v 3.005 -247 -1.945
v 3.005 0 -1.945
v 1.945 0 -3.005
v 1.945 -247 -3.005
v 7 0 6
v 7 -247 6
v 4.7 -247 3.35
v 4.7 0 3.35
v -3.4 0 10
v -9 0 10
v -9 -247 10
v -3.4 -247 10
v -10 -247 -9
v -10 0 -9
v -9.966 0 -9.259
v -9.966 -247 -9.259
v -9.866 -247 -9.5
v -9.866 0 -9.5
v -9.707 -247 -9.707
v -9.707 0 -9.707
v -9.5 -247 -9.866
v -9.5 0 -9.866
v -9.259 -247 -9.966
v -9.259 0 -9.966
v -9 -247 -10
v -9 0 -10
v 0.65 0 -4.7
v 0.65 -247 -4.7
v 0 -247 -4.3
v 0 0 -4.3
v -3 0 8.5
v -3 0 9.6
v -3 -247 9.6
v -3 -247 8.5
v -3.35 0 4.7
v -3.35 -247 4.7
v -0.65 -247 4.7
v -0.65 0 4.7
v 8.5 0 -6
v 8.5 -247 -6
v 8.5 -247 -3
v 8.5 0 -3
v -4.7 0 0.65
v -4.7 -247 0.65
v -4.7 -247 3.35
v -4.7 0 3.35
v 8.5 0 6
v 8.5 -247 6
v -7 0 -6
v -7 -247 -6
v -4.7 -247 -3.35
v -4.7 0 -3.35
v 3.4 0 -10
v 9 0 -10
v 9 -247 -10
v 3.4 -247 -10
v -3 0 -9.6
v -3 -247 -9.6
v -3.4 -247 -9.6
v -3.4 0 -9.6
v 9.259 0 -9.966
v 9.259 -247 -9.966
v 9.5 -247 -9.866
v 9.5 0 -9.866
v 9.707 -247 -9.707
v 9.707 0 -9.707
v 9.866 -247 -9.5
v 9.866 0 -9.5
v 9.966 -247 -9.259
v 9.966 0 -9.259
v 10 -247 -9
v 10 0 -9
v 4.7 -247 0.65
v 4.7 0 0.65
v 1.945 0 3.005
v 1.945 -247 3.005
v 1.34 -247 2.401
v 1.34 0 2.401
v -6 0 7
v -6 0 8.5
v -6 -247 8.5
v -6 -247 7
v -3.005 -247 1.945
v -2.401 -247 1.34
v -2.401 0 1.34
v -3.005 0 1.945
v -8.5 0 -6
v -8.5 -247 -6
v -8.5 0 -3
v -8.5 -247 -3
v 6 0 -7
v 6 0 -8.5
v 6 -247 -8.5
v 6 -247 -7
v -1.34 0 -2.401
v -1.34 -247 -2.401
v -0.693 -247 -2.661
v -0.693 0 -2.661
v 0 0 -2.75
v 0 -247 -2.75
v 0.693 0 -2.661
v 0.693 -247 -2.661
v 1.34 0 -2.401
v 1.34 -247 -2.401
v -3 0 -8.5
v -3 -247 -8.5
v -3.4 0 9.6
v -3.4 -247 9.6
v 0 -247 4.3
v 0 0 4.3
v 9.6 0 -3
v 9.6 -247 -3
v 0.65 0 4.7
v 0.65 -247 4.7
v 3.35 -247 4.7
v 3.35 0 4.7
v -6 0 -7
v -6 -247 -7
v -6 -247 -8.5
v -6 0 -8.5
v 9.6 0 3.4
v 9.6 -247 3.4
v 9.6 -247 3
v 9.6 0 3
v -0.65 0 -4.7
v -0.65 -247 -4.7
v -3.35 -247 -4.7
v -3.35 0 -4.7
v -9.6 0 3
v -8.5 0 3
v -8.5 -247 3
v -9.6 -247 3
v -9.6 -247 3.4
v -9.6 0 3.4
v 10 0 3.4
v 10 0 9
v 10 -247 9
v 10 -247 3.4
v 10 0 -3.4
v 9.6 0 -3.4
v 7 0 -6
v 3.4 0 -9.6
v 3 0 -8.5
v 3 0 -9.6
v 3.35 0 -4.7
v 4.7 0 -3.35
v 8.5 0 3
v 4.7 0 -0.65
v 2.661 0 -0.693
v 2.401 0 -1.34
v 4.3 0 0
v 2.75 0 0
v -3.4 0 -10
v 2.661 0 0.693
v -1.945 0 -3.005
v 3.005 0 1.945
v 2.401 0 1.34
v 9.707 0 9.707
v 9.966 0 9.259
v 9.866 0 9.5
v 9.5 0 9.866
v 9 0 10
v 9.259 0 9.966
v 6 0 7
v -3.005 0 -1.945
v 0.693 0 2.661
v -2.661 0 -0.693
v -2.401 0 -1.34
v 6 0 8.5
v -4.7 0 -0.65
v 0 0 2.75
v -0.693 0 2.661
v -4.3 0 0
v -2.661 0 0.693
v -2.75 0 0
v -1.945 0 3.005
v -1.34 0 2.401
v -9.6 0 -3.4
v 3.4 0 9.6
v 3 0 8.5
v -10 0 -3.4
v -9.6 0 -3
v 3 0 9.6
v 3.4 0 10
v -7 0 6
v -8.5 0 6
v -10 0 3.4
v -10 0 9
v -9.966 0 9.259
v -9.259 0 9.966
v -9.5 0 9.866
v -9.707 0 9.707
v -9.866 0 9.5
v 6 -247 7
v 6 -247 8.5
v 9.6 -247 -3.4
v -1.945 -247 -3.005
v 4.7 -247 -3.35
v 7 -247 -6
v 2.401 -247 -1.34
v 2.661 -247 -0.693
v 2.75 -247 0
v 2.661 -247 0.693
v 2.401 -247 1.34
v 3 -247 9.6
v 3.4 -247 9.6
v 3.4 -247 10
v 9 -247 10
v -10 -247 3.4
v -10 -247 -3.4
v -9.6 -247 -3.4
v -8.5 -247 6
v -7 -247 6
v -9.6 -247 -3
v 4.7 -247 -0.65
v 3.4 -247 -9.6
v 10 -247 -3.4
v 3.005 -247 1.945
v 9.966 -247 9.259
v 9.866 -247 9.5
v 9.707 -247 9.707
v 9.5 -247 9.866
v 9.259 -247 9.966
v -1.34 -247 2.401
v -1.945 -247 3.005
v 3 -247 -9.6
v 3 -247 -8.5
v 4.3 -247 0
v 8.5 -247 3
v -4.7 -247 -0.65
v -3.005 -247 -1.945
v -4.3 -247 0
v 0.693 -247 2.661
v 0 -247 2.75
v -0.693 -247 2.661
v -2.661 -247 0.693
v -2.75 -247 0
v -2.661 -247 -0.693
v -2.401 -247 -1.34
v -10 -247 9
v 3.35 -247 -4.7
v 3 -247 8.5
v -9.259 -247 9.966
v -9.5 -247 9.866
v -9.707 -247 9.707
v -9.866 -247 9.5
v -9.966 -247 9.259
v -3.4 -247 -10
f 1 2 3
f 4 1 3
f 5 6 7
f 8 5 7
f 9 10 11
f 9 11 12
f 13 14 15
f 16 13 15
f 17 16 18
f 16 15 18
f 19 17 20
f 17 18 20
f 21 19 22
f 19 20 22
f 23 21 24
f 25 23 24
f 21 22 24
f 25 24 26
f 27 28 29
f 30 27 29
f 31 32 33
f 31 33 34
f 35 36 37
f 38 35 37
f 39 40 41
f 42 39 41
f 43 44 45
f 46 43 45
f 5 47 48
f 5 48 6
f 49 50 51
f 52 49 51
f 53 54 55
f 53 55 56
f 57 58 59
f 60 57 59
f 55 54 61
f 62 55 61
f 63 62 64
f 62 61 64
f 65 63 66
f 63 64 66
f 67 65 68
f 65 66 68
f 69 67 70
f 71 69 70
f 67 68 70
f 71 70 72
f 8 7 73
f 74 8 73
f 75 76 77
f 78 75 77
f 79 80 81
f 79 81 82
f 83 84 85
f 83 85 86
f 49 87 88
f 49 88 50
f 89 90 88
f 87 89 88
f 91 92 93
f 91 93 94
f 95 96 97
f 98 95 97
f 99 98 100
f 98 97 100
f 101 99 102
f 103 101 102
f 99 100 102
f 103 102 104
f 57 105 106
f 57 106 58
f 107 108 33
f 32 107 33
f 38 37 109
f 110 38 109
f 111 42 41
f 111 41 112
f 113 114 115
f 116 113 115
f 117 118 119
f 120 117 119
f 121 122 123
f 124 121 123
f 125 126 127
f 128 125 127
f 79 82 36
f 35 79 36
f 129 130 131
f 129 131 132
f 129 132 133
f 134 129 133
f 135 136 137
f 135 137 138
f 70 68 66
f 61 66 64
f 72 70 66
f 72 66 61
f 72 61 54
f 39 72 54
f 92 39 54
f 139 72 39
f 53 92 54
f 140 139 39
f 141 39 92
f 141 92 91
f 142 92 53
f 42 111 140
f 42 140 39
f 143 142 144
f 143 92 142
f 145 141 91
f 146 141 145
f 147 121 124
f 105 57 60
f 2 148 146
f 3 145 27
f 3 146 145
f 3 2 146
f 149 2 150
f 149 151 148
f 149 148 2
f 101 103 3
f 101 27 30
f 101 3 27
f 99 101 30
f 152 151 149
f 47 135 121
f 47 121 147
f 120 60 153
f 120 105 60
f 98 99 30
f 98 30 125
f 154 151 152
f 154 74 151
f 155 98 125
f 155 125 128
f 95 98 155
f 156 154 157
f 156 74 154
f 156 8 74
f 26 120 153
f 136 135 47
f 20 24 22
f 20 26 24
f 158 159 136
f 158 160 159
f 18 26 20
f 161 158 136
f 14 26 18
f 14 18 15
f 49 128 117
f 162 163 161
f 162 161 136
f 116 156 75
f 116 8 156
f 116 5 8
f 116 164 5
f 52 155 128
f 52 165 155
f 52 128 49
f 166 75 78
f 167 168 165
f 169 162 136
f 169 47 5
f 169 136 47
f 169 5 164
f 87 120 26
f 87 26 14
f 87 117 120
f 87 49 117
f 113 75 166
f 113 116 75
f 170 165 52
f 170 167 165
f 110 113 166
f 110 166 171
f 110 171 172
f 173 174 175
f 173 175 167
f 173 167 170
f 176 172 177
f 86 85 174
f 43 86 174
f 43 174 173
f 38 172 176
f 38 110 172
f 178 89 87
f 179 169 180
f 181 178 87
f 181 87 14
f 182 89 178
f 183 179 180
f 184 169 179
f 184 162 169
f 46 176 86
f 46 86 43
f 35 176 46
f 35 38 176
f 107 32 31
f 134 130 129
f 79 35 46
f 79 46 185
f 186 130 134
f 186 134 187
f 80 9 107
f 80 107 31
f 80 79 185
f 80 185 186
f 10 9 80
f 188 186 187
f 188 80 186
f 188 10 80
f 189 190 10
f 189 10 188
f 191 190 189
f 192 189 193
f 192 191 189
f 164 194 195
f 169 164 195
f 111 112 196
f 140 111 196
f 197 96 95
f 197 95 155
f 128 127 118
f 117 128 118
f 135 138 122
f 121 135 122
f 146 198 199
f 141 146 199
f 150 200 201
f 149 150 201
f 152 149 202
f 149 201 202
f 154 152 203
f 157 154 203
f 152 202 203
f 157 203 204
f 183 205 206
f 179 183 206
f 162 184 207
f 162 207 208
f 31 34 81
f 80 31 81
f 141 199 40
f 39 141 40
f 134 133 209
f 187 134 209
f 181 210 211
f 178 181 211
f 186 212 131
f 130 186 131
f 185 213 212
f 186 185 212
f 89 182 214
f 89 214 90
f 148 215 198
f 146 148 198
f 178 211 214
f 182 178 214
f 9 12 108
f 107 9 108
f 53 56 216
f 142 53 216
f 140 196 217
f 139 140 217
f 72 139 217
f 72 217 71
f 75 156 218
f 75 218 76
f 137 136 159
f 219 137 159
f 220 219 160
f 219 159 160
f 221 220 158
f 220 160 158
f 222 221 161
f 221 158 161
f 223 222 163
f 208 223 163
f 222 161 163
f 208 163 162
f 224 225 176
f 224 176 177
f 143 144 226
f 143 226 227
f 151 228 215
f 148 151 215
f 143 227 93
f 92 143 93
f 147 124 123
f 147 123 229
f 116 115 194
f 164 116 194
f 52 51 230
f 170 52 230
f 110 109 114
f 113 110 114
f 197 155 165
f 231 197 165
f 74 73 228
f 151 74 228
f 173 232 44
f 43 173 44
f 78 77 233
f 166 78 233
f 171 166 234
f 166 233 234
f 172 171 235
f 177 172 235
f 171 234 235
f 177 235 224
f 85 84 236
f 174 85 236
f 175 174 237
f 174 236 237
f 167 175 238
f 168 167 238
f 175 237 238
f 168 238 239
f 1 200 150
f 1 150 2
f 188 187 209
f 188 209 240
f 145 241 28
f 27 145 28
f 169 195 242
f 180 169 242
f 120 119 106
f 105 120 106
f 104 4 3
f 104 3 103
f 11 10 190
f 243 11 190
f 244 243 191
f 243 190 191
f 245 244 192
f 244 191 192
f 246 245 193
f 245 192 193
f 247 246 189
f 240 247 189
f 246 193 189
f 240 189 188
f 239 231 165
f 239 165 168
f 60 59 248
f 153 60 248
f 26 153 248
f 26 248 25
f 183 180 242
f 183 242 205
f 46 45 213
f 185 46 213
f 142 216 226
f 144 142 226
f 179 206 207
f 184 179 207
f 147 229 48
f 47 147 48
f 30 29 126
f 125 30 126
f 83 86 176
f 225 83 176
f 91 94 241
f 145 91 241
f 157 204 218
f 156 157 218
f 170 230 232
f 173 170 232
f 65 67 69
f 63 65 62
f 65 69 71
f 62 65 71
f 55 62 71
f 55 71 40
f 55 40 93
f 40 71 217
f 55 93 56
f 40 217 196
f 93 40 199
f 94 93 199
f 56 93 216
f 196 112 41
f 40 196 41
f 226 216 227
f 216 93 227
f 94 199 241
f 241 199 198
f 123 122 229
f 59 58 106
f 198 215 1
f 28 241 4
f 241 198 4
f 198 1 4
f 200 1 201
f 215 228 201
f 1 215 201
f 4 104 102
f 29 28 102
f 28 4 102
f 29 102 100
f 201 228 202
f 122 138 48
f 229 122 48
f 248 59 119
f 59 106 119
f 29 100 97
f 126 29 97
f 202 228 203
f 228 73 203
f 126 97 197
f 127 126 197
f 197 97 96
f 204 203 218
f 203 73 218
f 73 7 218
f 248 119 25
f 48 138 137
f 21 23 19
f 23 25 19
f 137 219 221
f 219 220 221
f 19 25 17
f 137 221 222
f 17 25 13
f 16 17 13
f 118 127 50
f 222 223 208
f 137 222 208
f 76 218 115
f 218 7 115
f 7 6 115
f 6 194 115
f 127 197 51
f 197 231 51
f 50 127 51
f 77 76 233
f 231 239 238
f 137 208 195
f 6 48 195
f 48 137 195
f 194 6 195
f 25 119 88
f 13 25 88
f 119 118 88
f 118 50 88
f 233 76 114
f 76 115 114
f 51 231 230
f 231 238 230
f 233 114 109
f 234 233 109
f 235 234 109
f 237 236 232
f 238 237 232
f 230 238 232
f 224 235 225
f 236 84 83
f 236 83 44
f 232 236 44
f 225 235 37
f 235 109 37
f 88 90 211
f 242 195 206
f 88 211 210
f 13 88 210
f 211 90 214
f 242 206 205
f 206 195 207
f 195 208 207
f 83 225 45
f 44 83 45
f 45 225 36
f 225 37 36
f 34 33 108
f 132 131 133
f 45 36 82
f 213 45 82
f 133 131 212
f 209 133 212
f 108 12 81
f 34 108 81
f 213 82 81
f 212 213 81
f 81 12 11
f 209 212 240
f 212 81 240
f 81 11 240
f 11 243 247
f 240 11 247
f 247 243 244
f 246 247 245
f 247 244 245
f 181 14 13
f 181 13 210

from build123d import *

# Parameters (mm, degrees)
PAD001009_DEPTH       = 247
POCKET021005004_DEPTH = 247
POLARPATTERN003_COUNT = 4
POCKET021005005_DEPTH = 247


with BuildPart() as part:
    # Sketch046 → Pad001009 (new body)
    with BuildSketch(Plane.XZ):
        with BuildLine():
            Line((-9, 10), (9, 10))
            ThreePointArc((10, 9), (9.707107, 9.707107), (9, 10))
            Line((10, 9), (10, -9))
            ThreePointArc((9, -10), (9.707107, -9.707107), (10, -9))
            Line((9, -10), (-9, -10))
            ThreePointArc((-10, -9), (-9.707107, -9.707107), (-9, -10))
            Line((-10, -9), (-10, 9))
            ThreePointArc((-9, 10), (-9.707107, 9.707107), (-10, 9))
        make_face()
    extrude(amount=PAD001009_DEPTH)

    # Sketch045 (on Face10 of Pad001009) → Pocket021005004 (cut)
    with BuildSketch(Plane.XZ.offset(247)):
        Polygon((-3.4, 10), (-3.4, 9.6), (-3, 9.6), (-3, 8.5), (-6, 8.5), (-6, 7), (-3.35, 4.7), (-0.65, 4.7), (0, 4.3), (0.65, 4.7), (3.35, 4.7), (6, 7), (6, 8.5), (3, 8.5), (3, 9.6), (3.4, 9.6), (3.4, 10), align=None)
    pocket021005004 = extrude(amount=-POCKET021005004_DEPTH, mode=Mode.SUBTRACT)

    # PolarPattern003: Pocket021005004 ×4 about axis
    polarpattern003_axis = Axis((0, -247, 0), (0, -1, 0))
    for i in range(1, POLARPATTERN003_COUNT):
        add(pocket021005004.rotate(polarpattern003_axis, i * 360 / POLARPATTERN003_COUNT), mode=Mode.SUBTRACT)

    # Sketch044 (on Face4 of PolarPattern003) → Pocket021005005 (cut)
    with BuildSketch(Plane.XZ.offset(247)):
        with BuildLine():
            ThreePointArc((1.340499, 2.401159), (0, 2.75), (-1.340499, 2.401159))
            Line((-1.944544, 3.005204), (-1.340499, 2.401159))
            Line((-3.005204, 1.944544), (-1.944544, 3.005204))
            Line((-2.401159, 1.340499), (-3.005204, 1.944544))
            ThreePointArc((-2.401159, 1.340499), (-2.75, 0), (-2.401159, -1.340499))
            Line((-3.005204, -1.944544), (-2.401159, -1.340499))
            Line((-1.944544, -3.005204), (-3.005204, -1.944544))
            Line((-1.340499, -2.401159), (-1.944544, -3.005204))
            ThreePointArc((-1.340499, -2.401159), (0, -2.75), (1.340499, -2.401159))
            Line((1.944544, -3.005204), (1.340499, -2.401159))
            Line((3.005204, -1.944544), (1.944544, -3.005204))
            Line((2.401159, -1.340499), (3.005204, -1.944544))
            ThreePointArc((2.401159, -1.340499), (2.75, 0), (2.401159, 1.340499))
            Line((2.401159, 1.340499), (3.005204, 1.944544))
            Line((3.005204, 1.944544), (1.944544, 3.005204))
            Line((1.944544, 3.005204), (1.340499, 2.401159))
        make_face()
    extrude(amount=-POCKET021005005_DEPTH, mode=Mode.SUBTRACT)


solid = part.part
